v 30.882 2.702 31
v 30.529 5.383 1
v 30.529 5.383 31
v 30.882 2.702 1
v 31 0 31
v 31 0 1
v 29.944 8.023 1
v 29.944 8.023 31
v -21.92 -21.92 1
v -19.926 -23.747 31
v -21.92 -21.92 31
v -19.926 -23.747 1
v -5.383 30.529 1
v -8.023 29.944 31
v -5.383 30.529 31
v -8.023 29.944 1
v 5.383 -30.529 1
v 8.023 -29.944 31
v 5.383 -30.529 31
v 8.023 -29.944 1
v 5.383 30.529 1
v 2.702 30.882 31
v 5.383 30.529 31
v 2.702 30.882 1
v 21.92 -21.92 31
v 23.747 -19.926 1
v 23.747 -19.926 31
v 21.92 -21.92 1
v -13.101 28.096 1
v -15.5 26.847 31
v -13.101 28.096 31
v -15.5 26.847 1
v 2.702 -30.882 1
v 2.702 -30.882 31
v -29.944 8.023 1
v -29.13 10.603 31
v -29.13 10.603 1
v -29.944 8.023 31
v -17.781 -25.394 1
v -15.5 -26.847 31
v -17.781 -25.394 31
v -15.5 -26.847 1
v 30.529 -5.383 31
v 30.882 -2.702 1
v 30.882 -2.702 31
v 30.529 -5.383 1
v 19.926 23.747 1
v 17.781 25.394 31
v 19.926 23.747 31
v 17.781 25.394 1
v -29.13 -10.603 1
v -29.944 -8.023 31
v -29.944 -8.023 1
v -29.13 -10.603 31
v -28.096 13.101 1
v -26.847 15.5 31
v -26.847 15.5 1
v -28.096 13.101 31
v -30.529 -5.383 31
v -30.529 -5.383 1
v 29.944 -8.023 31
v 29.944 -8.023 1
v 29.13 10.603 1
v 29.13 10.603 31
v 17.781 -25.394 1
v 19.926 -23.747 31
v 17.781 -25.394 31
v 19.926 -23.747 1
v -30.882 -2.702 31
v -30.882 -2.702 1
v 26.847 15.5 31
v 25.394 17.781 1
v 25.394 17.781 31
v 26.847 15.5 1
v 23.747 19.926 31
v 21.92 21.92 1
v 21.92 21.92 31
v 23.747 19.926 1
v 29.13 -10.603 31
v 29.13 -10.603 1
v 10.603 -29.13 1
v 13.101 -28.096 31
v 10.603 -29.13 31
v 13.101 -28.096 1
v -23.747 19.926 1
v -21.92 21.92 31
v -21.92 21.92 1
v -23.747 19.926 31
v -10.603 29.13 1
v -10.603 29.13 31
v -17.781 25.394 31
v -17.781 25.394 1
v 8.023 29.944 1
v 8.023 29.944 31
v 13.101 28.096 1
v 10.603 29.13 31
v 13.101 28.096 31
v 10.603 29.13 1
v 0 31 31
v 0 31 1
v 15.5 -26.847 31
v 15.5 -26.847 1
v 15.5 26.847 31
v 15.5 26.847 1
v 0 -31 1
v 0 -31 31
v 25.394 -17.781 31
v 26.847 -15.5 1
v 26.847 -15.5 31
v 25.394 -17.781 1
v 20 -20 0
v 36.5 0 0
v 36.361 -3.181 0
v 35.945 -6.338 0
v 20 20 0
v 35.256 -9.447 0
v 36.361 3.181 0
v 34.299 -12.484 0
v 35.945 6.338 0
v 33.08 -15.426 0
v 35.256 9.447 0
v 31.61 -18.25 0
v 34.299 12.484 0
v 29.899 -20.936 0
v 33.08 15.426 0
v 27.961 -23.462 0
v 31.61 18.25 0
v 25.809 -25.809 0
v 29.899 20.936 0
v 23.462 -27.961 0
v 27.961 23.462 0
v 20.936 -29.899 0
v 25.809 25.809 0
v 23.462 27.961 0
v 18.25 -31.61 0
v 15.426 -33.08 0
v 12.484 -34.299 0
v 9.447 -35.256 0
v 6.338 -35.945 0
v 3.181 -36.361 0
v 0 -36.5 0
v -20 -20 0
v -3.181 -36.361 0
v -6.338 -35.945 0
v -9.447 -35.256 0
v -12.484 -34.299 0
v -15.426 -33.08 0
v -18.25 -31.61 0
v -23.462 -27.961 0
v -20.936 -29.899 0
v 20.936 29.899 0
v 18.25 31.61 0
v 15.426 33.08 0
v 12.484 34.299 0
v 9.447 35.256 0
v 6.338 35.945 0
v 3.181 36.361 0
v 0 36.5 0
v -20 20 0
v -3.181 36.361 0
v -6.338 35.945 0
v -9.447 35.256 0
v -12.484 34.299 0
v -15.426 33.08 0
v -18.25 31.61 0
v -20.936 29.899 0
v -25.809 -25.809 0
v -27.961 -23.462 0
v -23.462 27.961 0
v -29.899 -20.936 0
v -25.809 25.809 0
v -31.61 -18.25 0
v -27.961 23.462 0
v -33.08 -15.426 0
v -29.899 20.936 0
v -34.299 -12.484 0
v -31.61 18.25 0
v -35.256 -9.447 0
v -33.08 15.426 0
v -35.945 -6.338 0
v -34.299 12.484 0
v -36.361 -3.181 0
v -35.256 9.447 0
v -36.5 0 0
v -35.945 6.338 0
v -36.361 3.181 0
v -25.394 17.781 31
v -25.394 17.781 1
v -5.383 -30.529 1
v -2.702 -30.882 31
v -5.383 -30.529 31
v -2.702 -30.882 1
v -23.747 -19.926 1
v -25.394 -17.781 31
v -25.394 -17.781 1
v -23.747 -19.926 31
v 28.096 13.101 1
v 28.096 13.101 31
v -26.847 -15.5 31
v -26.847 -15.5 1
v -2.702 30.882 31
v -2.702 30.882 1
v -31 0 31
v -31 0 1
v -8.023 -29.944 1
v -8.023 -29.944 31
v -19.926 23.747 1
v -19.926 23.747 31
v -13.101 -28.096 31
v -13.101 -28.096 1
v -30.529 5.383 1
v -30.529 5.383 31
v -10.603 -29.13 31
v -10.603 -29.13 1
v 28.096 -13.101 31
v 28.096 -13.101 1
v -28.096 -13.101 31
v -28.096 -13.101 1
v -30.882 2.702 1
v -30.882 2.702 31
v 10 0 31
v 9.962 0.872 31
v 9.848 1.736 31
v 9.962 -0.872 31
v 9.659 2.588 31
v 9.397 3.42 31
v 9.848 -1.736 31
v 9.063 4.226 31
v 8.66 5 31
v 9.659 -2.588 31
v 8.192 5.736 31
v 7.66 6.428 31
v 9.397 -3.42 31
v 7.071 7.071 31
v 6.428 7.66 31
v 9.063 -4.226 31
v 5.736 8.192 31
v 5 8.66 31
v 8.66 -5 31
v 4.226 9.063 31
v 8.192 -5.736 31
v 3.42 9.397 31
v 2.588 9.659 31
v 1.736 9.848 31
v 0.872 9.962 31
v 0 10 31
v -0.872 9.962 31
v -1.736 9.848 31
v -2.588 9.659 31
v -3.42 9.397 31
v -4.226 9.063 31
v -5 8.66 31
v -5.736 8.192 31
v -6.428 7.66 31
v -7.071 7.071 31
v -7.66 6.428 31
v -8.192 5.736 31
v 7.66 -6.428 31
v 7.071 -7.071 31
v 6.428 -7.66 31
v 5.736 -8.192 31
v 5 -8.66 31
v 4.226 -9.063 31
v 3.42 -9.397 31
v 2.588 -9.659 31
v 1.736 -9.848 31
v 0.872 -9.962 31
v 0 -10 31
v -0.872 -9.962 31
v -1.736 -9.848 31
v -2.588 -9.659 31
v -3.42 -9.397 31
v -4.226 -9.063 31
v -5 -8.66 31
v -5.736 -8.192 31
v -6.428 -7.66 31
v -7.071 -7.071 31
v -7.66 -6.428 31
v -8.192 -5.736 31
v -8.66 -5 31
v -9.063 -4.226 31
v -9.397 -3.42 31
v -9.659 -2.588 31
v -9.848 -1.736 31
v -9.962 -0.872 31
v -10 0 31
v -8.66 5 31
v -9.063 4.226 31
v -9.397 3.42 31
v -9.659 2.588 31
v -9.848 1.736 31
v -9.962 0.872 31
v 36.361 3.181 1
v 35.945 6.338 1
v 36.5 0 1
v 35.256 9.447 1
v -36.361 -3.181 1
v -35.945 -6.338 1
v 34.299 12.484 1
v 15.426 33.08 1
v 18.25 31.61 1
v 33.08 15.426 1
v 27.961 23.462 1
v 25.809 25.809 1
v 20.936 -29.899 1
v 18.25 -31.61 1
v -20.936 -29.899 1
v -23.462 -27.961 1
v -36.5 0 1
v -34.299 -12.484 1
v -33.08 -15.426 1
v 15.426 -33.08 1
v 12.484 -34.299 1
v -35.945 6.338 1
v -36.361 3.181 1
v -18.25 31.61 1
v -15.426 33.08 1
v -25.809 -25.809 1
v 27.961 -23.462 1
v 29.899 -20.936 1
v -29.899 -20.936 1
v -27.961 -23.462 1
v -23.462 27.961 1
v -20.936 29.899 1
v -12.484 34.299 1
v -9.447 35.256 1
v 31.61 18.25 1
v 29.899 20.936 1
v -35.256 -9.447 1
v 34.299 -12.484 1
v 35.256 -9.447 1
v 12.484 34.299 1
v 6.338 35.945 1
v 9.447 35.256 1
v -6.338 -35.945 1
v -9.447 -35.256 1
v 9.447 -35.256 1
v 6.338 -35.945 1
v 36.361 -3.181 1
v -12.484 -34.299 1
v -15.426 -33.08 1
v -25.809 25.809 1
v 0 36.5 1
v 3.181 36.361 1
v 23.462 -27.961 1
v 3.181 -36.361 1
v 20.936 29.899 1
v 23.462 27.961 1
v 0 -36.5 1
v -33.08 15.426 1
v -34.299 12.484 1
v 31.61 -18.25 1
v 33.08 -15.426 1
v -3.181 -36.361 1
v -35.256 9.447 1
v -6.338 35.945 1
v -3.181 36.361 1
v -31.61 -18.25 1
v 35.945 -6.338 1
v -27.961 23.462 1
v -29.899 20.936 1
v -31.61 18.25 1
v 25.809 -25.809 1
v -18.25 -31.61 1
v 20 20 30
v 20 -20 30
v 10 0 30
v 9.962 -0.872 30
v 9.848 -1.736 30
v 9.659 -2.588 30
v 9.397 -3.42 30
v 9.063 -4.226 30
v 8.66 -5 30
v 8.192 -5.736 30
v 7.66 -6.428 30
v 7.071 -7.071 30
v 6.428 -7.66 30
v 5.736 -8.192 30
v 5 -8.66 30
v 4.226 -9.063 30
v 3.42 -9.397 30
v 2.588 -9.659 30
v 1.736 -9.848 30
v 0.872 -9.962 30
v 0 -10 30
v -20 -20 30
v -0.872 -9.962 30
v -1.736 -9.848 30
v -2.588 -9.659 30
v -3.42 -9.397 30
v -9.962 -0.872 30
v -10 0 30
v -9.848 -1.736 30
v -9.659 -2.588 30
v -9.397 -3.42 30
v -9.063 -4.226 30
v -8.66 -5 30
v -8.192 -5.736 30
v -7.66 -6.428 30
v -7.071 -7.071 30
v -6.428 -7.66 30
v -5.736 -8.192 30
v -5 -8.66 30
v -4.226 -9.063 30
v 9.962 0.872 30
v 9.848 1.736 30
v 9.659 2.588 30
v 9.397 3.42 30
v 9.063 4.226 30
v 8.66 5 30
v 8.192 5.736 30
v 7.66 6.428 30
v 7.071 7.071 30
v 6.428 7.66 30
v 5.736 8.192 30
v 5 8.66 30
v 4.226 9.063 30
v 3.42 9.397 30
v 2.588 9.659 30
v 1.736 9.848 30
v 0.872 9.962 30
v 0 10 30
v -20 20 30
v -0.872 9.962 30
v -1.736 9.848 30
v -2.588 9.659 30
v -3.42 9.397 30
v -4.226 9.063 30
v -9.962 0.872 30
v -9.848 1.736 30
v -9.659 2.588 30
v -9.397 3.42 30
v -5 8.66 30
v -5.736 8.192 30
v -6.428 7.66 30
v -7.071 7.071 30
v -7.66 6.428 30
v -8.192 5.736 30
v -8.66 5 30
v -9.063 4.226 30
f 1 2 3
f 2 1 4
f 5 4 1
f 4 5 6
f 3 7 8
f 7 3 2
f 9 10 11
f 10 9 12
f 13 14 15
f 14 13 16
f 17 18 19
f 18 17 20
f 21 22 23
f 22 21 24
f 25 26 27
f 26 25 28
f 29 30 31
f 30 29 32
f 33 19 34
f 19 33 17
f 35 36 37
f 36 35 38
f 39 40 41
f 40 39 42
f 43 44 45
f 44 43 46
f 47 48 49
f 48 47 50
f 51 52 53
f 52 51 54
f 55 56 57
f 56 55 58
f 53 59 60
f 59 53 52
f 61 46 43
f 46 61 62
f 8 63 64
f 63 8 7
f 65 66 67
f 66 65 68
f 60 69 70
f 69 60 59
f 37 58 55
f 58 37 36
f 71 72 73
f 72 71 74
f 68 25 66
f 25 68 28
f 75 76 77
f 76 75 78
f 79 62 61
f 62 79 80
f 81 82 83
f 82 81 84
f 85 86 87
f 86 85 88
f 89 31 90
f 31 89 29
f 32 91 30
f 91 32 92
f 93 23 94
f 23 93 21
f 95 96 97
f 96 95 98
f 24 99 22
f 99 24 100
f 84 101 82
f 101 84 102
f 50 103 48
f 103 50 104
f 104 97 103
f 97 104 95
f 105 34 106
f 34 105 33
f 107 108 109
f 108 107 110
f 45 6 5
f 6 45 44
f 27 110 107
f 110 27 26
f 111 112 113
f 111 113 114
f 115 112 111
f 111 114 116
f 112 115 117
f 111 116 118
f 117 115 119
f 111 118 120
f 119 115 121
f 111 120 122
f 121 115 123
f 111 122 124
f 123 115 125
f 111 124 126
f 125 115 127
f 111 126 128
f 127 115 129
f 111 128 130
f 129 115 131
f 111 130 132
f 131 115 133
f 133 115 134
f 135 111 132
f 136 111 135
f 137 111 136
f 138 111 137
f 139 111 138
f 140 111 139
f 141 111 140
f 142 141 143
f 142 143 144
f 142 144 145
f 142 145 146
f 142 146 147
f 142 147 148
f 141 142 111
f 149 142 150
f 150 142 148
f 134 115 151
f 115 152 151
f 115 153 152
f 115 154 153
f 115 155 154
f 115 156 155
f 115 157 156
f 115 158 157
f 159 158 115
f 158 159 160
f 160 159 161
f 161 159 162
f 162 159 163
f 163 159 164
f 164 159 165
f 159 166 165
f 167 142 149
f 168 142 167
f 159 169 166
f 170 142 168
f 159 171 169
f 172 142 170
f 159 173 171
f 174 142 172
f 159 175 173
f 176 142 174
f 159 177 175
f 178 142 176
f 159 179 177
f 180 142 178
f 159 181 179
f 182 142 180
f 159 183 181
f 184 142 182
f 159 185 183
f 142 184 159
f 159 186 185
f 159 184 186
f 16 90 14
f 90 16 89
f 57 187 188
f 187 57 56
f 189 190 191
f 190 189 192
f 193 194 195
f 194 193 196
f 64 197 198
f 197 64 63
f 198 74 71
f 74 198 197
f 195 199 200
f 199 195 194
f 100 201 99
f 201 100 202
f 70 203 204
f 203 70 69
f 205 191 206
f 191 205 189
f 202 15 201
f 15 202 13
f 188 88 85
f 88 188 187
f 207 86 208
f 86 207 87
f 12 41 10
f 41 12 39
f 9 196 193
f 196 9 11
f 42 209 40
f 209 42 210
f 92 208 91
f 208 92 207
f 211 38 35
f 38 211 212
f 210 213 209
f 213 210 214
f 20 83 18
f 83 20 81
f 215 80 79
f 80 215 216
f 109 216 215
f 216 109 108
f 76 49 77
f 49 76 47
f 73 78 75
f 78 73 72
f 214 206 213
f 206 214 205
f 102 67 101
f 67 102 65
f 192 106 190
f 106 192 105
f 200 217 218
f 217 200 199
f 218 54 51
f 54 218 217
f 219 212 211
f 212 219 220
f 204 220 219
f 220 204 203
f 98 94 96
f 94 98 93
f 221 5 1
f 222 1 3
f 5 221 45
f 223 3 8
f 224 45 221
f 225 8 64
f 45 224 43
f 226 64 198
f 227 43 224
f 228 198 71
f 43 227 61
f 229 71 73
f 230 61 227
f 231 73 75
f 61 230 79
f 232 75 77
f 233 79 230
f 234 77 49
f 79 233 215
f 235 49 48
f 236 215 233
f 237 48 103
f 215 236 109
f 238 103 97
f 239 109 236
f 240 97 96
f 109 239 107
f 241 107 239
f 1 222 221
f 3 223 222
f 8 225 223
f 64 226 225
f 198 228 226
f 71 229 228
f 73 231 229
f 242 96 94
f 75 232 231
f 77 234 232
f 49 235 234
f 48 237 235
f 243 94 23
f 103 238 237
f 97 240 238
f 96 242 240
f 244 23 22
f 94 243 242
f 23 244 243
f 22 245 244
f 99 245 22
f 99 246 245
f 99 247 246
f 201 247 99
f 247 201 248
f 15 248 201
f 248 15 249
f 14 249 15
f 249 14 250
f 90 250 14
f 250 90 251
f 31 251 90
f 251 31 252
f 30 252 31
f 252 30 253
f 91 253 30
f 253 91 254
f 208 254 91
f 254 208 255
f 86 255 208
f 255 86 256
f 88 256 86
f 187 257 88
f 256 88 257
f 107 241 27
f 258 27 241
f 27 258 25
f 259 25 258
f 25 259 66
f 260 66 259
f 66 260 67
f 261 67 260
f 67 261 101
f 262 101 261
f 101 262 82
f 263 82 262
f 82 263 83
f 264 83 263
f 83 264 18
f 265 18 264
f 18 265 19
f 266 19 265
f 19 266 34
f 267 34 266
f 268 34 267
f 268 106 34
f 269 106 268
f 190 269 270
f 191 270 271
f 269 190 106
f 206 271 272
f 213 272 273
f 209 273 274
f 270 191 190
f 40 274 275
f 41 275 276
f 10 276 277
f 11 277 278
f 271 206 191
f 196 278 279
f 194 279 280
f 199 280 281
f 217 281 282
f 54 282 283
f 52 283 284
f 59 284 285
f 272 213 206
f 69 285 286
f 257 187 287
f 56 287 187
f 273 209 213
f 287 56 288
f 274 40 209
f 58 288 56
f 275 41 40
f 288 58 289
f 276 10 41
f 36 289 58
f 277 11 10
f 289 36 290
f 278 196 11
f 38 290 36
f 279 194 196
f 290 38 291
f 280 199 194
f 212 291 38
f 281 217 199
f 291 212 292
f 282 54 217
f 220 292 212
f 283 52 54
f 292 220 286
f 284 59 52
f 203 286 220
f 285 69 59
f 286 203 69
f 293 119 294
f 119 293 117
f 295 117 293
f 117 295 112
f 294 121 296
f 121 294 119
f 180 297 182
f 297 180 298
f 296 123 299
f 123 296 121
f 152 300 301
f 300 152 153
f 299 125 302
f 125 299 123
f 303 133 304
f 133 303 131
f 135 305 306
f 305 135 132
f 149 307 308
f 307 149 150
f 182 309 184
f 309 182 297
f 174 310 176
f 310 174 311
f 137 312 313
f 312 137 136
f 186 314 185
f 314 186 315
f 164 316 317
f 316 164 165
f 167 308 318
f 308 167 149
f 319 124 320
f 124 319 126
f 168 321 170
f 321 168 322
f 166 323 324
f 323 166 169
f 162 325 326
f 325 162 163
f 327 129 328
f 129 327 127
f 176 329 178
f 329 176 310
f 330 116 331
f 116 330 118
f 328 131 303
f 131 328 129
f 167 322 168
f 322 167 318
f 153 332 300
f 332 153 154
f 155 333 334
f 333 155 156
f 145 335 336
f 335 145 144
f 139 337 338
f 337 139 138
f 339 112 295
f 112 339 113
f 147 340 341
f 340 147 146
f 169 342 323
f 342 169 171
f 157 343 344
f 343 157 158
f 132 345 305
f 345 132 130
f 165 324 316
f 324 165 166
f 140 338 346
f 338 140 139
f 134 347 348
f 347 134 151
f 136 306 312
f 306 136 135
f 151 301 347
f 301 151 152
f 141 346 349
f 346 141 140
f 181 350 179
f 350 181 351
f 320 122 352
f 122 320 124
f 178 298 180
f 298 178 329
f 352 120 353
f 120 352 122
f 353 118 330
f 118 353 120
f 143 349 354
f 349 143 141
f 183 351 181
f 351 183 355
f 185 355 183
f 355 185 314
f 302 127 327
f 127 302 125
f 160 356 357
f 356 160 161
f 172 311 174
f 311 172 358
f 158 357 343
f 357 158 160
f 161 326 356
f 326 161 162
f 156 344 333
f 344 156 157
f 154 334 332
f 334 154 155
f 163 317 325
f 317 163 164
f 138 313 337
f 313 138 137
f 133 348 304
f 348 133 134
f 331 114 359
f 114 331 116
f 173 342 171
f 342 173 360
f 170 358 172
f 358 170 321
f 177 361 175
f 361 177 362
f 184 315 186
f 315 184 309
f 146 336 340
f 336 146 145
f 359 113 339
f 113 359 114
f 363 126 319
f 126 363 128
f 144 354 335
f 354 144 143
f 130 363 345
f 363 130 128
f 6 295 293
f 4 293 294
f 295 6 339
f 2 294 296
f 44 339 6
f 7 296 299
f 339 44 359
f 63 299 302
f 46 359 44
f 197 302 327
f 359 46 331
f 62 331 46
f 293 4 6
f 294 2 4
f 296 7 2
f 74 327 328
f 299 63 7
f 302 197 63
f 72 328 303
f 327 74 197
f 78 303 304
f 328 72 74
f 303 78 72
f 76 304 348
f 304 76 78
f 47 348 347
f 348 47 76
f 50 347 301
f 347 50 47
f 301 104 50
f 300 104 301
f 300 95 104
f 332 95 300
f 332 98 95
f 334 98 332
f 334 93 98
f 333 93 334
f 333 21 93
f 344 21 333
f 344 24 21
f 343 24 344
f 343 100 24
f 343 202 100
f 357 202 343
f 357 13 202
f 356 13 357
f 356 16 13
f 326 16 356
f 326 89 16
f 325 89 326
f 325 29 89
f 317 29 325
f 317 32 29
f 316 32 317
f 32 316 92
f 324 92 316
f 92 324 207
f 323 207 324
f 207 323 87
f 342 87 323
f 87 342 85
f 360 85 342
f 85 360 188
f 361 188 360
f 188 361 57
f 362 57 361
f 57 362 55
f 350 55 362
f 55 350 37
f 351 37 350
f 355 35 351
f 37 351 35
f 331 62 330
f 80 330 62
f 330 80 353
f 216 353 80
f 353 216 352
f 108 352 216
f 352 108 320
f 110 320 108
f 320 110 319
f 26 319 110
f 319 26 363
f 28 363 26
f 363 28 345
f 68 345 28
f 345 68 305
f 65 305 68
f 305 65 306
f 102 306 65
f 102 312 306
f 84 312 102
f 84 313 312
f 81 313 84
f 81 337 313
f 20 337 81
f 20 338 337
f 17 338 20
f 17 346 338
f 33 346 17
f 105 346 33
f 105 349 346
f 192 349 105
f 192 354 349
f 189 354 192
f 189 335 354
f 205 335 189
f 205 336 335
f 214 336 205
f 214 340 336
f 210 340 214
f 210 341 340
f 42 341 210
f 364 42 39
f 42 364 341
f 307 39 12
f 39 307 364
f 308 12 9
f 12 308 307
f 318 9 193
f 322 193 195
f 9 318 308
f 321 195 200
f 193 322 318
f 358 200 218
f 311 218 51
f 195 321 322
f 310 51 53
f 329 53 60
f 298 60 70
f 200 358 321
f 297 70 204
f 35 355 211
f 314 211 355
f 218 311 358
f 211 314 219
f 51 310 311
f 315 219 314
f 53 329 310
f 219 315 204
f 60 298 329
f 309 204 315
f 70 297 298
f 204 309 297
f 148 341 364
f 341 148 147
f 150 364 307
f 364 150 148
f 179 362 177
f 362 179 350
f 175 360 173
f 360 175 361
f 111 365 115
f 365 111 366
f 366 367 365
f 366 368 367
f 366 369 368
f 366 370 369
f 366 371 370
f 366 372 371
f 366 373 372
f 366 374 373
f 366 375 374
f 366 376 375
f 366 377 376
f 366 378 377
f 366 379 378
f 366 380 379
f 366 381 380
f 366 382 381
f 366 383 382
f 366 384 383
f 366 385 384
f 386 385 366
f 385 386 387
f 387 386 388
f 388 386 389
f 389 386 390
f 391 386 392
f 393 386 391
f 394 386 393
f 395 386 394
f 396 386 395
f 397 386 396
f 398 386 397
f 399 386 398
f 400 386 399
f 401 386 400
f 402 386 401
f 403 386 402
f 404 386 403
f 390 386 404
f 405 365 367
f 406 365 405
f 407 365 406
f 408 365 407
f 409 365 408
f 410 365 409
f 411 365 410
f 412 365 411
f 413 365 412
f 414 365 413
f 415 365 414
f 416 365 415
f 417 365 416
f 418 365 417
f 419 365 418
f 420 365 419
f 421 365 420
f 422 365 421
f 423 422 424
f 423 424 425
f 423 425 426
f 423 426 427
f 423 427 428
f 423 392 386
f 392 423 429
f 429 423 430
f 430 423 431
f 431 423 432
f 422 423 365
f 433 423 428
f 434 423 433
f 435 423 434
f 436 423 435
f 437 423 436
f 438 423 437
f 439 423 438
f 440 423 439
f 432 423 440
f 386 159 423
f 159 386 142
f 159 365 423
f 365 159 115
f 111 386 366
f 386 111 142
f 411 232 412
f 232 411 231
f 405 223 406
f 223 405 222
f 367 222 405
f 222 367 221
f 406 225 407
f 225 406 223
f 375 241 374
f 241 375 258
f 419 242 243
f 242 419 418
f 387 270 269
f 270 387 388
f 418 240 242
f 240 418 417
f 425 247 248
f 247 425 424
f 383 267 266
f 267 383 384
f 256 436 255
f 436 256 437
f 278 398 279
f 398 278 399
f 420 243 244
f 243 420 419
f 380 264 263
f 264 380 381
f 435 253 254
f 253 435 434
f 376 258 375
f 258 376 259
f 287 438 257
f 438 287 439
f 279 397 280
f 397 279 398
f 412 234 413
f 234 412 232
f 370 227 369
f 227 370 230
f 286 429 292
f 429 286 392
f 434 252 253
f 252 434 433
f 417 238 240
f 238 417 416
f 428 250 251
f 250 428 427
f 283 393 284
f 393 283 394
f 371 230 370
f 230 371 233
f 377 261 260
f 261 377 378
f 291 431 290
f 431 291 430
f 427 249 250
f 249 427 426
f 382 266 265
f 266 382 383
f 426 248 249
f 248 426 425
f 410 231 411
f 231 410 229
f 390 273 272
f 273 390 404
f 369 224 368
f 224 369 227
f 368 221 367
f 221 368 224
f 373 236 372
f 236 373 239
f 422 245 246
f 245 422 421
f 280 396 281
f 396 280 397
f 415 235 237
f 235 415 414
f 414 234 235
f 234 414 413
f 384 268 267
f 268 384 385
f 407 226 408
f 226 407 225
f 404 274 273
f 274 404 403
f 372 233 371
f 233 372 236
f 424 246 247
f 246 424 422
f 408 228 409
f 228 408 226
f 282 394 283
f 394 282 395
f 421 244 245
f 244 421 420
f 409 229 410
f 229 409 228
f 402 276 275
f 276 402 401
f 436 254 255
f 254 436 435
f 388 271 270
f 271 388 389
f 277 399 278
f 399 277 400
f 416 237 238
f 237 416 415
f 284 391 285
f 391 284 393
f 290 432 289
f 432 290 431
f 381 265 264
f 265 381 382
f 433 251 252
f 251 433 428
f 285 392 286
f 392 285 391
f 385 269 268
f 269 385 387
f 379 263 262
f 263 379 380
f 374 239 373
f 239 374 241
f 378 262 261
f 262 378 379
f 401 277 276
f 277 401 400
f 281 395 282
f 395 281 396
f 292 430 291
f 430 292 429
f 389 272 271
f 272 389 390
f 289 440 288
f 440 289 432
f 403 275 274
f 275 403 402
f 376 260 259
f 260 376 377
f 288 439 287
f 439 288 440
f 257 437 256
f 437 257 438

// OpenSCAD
//General
$fn = 72;
tolerance = 0.5;
wall = 1;
r_cover = 65/2; // cap
r_cover_body = r_cover-1;
r_foam = 40;
r_stem_hole = 20;
r_cover_cap = r_cover_body + 5; // 5mm rim?
h_cover = 30 + wall; // total height including rim

difference(){
  union(){
    cylinder(r=r_cover_body-tolerance, h=h_cover);
    cylinder(r=r_cover_cap, h=wall);
  }
  translate([0,0,h_cover/2-wall])
  cube([r_foam, r_foam, h_cover], center=true);
  translate([0,0,h_cover/2])
  cylinder(r=r_stem_hole/2, h=h_cover);
}
